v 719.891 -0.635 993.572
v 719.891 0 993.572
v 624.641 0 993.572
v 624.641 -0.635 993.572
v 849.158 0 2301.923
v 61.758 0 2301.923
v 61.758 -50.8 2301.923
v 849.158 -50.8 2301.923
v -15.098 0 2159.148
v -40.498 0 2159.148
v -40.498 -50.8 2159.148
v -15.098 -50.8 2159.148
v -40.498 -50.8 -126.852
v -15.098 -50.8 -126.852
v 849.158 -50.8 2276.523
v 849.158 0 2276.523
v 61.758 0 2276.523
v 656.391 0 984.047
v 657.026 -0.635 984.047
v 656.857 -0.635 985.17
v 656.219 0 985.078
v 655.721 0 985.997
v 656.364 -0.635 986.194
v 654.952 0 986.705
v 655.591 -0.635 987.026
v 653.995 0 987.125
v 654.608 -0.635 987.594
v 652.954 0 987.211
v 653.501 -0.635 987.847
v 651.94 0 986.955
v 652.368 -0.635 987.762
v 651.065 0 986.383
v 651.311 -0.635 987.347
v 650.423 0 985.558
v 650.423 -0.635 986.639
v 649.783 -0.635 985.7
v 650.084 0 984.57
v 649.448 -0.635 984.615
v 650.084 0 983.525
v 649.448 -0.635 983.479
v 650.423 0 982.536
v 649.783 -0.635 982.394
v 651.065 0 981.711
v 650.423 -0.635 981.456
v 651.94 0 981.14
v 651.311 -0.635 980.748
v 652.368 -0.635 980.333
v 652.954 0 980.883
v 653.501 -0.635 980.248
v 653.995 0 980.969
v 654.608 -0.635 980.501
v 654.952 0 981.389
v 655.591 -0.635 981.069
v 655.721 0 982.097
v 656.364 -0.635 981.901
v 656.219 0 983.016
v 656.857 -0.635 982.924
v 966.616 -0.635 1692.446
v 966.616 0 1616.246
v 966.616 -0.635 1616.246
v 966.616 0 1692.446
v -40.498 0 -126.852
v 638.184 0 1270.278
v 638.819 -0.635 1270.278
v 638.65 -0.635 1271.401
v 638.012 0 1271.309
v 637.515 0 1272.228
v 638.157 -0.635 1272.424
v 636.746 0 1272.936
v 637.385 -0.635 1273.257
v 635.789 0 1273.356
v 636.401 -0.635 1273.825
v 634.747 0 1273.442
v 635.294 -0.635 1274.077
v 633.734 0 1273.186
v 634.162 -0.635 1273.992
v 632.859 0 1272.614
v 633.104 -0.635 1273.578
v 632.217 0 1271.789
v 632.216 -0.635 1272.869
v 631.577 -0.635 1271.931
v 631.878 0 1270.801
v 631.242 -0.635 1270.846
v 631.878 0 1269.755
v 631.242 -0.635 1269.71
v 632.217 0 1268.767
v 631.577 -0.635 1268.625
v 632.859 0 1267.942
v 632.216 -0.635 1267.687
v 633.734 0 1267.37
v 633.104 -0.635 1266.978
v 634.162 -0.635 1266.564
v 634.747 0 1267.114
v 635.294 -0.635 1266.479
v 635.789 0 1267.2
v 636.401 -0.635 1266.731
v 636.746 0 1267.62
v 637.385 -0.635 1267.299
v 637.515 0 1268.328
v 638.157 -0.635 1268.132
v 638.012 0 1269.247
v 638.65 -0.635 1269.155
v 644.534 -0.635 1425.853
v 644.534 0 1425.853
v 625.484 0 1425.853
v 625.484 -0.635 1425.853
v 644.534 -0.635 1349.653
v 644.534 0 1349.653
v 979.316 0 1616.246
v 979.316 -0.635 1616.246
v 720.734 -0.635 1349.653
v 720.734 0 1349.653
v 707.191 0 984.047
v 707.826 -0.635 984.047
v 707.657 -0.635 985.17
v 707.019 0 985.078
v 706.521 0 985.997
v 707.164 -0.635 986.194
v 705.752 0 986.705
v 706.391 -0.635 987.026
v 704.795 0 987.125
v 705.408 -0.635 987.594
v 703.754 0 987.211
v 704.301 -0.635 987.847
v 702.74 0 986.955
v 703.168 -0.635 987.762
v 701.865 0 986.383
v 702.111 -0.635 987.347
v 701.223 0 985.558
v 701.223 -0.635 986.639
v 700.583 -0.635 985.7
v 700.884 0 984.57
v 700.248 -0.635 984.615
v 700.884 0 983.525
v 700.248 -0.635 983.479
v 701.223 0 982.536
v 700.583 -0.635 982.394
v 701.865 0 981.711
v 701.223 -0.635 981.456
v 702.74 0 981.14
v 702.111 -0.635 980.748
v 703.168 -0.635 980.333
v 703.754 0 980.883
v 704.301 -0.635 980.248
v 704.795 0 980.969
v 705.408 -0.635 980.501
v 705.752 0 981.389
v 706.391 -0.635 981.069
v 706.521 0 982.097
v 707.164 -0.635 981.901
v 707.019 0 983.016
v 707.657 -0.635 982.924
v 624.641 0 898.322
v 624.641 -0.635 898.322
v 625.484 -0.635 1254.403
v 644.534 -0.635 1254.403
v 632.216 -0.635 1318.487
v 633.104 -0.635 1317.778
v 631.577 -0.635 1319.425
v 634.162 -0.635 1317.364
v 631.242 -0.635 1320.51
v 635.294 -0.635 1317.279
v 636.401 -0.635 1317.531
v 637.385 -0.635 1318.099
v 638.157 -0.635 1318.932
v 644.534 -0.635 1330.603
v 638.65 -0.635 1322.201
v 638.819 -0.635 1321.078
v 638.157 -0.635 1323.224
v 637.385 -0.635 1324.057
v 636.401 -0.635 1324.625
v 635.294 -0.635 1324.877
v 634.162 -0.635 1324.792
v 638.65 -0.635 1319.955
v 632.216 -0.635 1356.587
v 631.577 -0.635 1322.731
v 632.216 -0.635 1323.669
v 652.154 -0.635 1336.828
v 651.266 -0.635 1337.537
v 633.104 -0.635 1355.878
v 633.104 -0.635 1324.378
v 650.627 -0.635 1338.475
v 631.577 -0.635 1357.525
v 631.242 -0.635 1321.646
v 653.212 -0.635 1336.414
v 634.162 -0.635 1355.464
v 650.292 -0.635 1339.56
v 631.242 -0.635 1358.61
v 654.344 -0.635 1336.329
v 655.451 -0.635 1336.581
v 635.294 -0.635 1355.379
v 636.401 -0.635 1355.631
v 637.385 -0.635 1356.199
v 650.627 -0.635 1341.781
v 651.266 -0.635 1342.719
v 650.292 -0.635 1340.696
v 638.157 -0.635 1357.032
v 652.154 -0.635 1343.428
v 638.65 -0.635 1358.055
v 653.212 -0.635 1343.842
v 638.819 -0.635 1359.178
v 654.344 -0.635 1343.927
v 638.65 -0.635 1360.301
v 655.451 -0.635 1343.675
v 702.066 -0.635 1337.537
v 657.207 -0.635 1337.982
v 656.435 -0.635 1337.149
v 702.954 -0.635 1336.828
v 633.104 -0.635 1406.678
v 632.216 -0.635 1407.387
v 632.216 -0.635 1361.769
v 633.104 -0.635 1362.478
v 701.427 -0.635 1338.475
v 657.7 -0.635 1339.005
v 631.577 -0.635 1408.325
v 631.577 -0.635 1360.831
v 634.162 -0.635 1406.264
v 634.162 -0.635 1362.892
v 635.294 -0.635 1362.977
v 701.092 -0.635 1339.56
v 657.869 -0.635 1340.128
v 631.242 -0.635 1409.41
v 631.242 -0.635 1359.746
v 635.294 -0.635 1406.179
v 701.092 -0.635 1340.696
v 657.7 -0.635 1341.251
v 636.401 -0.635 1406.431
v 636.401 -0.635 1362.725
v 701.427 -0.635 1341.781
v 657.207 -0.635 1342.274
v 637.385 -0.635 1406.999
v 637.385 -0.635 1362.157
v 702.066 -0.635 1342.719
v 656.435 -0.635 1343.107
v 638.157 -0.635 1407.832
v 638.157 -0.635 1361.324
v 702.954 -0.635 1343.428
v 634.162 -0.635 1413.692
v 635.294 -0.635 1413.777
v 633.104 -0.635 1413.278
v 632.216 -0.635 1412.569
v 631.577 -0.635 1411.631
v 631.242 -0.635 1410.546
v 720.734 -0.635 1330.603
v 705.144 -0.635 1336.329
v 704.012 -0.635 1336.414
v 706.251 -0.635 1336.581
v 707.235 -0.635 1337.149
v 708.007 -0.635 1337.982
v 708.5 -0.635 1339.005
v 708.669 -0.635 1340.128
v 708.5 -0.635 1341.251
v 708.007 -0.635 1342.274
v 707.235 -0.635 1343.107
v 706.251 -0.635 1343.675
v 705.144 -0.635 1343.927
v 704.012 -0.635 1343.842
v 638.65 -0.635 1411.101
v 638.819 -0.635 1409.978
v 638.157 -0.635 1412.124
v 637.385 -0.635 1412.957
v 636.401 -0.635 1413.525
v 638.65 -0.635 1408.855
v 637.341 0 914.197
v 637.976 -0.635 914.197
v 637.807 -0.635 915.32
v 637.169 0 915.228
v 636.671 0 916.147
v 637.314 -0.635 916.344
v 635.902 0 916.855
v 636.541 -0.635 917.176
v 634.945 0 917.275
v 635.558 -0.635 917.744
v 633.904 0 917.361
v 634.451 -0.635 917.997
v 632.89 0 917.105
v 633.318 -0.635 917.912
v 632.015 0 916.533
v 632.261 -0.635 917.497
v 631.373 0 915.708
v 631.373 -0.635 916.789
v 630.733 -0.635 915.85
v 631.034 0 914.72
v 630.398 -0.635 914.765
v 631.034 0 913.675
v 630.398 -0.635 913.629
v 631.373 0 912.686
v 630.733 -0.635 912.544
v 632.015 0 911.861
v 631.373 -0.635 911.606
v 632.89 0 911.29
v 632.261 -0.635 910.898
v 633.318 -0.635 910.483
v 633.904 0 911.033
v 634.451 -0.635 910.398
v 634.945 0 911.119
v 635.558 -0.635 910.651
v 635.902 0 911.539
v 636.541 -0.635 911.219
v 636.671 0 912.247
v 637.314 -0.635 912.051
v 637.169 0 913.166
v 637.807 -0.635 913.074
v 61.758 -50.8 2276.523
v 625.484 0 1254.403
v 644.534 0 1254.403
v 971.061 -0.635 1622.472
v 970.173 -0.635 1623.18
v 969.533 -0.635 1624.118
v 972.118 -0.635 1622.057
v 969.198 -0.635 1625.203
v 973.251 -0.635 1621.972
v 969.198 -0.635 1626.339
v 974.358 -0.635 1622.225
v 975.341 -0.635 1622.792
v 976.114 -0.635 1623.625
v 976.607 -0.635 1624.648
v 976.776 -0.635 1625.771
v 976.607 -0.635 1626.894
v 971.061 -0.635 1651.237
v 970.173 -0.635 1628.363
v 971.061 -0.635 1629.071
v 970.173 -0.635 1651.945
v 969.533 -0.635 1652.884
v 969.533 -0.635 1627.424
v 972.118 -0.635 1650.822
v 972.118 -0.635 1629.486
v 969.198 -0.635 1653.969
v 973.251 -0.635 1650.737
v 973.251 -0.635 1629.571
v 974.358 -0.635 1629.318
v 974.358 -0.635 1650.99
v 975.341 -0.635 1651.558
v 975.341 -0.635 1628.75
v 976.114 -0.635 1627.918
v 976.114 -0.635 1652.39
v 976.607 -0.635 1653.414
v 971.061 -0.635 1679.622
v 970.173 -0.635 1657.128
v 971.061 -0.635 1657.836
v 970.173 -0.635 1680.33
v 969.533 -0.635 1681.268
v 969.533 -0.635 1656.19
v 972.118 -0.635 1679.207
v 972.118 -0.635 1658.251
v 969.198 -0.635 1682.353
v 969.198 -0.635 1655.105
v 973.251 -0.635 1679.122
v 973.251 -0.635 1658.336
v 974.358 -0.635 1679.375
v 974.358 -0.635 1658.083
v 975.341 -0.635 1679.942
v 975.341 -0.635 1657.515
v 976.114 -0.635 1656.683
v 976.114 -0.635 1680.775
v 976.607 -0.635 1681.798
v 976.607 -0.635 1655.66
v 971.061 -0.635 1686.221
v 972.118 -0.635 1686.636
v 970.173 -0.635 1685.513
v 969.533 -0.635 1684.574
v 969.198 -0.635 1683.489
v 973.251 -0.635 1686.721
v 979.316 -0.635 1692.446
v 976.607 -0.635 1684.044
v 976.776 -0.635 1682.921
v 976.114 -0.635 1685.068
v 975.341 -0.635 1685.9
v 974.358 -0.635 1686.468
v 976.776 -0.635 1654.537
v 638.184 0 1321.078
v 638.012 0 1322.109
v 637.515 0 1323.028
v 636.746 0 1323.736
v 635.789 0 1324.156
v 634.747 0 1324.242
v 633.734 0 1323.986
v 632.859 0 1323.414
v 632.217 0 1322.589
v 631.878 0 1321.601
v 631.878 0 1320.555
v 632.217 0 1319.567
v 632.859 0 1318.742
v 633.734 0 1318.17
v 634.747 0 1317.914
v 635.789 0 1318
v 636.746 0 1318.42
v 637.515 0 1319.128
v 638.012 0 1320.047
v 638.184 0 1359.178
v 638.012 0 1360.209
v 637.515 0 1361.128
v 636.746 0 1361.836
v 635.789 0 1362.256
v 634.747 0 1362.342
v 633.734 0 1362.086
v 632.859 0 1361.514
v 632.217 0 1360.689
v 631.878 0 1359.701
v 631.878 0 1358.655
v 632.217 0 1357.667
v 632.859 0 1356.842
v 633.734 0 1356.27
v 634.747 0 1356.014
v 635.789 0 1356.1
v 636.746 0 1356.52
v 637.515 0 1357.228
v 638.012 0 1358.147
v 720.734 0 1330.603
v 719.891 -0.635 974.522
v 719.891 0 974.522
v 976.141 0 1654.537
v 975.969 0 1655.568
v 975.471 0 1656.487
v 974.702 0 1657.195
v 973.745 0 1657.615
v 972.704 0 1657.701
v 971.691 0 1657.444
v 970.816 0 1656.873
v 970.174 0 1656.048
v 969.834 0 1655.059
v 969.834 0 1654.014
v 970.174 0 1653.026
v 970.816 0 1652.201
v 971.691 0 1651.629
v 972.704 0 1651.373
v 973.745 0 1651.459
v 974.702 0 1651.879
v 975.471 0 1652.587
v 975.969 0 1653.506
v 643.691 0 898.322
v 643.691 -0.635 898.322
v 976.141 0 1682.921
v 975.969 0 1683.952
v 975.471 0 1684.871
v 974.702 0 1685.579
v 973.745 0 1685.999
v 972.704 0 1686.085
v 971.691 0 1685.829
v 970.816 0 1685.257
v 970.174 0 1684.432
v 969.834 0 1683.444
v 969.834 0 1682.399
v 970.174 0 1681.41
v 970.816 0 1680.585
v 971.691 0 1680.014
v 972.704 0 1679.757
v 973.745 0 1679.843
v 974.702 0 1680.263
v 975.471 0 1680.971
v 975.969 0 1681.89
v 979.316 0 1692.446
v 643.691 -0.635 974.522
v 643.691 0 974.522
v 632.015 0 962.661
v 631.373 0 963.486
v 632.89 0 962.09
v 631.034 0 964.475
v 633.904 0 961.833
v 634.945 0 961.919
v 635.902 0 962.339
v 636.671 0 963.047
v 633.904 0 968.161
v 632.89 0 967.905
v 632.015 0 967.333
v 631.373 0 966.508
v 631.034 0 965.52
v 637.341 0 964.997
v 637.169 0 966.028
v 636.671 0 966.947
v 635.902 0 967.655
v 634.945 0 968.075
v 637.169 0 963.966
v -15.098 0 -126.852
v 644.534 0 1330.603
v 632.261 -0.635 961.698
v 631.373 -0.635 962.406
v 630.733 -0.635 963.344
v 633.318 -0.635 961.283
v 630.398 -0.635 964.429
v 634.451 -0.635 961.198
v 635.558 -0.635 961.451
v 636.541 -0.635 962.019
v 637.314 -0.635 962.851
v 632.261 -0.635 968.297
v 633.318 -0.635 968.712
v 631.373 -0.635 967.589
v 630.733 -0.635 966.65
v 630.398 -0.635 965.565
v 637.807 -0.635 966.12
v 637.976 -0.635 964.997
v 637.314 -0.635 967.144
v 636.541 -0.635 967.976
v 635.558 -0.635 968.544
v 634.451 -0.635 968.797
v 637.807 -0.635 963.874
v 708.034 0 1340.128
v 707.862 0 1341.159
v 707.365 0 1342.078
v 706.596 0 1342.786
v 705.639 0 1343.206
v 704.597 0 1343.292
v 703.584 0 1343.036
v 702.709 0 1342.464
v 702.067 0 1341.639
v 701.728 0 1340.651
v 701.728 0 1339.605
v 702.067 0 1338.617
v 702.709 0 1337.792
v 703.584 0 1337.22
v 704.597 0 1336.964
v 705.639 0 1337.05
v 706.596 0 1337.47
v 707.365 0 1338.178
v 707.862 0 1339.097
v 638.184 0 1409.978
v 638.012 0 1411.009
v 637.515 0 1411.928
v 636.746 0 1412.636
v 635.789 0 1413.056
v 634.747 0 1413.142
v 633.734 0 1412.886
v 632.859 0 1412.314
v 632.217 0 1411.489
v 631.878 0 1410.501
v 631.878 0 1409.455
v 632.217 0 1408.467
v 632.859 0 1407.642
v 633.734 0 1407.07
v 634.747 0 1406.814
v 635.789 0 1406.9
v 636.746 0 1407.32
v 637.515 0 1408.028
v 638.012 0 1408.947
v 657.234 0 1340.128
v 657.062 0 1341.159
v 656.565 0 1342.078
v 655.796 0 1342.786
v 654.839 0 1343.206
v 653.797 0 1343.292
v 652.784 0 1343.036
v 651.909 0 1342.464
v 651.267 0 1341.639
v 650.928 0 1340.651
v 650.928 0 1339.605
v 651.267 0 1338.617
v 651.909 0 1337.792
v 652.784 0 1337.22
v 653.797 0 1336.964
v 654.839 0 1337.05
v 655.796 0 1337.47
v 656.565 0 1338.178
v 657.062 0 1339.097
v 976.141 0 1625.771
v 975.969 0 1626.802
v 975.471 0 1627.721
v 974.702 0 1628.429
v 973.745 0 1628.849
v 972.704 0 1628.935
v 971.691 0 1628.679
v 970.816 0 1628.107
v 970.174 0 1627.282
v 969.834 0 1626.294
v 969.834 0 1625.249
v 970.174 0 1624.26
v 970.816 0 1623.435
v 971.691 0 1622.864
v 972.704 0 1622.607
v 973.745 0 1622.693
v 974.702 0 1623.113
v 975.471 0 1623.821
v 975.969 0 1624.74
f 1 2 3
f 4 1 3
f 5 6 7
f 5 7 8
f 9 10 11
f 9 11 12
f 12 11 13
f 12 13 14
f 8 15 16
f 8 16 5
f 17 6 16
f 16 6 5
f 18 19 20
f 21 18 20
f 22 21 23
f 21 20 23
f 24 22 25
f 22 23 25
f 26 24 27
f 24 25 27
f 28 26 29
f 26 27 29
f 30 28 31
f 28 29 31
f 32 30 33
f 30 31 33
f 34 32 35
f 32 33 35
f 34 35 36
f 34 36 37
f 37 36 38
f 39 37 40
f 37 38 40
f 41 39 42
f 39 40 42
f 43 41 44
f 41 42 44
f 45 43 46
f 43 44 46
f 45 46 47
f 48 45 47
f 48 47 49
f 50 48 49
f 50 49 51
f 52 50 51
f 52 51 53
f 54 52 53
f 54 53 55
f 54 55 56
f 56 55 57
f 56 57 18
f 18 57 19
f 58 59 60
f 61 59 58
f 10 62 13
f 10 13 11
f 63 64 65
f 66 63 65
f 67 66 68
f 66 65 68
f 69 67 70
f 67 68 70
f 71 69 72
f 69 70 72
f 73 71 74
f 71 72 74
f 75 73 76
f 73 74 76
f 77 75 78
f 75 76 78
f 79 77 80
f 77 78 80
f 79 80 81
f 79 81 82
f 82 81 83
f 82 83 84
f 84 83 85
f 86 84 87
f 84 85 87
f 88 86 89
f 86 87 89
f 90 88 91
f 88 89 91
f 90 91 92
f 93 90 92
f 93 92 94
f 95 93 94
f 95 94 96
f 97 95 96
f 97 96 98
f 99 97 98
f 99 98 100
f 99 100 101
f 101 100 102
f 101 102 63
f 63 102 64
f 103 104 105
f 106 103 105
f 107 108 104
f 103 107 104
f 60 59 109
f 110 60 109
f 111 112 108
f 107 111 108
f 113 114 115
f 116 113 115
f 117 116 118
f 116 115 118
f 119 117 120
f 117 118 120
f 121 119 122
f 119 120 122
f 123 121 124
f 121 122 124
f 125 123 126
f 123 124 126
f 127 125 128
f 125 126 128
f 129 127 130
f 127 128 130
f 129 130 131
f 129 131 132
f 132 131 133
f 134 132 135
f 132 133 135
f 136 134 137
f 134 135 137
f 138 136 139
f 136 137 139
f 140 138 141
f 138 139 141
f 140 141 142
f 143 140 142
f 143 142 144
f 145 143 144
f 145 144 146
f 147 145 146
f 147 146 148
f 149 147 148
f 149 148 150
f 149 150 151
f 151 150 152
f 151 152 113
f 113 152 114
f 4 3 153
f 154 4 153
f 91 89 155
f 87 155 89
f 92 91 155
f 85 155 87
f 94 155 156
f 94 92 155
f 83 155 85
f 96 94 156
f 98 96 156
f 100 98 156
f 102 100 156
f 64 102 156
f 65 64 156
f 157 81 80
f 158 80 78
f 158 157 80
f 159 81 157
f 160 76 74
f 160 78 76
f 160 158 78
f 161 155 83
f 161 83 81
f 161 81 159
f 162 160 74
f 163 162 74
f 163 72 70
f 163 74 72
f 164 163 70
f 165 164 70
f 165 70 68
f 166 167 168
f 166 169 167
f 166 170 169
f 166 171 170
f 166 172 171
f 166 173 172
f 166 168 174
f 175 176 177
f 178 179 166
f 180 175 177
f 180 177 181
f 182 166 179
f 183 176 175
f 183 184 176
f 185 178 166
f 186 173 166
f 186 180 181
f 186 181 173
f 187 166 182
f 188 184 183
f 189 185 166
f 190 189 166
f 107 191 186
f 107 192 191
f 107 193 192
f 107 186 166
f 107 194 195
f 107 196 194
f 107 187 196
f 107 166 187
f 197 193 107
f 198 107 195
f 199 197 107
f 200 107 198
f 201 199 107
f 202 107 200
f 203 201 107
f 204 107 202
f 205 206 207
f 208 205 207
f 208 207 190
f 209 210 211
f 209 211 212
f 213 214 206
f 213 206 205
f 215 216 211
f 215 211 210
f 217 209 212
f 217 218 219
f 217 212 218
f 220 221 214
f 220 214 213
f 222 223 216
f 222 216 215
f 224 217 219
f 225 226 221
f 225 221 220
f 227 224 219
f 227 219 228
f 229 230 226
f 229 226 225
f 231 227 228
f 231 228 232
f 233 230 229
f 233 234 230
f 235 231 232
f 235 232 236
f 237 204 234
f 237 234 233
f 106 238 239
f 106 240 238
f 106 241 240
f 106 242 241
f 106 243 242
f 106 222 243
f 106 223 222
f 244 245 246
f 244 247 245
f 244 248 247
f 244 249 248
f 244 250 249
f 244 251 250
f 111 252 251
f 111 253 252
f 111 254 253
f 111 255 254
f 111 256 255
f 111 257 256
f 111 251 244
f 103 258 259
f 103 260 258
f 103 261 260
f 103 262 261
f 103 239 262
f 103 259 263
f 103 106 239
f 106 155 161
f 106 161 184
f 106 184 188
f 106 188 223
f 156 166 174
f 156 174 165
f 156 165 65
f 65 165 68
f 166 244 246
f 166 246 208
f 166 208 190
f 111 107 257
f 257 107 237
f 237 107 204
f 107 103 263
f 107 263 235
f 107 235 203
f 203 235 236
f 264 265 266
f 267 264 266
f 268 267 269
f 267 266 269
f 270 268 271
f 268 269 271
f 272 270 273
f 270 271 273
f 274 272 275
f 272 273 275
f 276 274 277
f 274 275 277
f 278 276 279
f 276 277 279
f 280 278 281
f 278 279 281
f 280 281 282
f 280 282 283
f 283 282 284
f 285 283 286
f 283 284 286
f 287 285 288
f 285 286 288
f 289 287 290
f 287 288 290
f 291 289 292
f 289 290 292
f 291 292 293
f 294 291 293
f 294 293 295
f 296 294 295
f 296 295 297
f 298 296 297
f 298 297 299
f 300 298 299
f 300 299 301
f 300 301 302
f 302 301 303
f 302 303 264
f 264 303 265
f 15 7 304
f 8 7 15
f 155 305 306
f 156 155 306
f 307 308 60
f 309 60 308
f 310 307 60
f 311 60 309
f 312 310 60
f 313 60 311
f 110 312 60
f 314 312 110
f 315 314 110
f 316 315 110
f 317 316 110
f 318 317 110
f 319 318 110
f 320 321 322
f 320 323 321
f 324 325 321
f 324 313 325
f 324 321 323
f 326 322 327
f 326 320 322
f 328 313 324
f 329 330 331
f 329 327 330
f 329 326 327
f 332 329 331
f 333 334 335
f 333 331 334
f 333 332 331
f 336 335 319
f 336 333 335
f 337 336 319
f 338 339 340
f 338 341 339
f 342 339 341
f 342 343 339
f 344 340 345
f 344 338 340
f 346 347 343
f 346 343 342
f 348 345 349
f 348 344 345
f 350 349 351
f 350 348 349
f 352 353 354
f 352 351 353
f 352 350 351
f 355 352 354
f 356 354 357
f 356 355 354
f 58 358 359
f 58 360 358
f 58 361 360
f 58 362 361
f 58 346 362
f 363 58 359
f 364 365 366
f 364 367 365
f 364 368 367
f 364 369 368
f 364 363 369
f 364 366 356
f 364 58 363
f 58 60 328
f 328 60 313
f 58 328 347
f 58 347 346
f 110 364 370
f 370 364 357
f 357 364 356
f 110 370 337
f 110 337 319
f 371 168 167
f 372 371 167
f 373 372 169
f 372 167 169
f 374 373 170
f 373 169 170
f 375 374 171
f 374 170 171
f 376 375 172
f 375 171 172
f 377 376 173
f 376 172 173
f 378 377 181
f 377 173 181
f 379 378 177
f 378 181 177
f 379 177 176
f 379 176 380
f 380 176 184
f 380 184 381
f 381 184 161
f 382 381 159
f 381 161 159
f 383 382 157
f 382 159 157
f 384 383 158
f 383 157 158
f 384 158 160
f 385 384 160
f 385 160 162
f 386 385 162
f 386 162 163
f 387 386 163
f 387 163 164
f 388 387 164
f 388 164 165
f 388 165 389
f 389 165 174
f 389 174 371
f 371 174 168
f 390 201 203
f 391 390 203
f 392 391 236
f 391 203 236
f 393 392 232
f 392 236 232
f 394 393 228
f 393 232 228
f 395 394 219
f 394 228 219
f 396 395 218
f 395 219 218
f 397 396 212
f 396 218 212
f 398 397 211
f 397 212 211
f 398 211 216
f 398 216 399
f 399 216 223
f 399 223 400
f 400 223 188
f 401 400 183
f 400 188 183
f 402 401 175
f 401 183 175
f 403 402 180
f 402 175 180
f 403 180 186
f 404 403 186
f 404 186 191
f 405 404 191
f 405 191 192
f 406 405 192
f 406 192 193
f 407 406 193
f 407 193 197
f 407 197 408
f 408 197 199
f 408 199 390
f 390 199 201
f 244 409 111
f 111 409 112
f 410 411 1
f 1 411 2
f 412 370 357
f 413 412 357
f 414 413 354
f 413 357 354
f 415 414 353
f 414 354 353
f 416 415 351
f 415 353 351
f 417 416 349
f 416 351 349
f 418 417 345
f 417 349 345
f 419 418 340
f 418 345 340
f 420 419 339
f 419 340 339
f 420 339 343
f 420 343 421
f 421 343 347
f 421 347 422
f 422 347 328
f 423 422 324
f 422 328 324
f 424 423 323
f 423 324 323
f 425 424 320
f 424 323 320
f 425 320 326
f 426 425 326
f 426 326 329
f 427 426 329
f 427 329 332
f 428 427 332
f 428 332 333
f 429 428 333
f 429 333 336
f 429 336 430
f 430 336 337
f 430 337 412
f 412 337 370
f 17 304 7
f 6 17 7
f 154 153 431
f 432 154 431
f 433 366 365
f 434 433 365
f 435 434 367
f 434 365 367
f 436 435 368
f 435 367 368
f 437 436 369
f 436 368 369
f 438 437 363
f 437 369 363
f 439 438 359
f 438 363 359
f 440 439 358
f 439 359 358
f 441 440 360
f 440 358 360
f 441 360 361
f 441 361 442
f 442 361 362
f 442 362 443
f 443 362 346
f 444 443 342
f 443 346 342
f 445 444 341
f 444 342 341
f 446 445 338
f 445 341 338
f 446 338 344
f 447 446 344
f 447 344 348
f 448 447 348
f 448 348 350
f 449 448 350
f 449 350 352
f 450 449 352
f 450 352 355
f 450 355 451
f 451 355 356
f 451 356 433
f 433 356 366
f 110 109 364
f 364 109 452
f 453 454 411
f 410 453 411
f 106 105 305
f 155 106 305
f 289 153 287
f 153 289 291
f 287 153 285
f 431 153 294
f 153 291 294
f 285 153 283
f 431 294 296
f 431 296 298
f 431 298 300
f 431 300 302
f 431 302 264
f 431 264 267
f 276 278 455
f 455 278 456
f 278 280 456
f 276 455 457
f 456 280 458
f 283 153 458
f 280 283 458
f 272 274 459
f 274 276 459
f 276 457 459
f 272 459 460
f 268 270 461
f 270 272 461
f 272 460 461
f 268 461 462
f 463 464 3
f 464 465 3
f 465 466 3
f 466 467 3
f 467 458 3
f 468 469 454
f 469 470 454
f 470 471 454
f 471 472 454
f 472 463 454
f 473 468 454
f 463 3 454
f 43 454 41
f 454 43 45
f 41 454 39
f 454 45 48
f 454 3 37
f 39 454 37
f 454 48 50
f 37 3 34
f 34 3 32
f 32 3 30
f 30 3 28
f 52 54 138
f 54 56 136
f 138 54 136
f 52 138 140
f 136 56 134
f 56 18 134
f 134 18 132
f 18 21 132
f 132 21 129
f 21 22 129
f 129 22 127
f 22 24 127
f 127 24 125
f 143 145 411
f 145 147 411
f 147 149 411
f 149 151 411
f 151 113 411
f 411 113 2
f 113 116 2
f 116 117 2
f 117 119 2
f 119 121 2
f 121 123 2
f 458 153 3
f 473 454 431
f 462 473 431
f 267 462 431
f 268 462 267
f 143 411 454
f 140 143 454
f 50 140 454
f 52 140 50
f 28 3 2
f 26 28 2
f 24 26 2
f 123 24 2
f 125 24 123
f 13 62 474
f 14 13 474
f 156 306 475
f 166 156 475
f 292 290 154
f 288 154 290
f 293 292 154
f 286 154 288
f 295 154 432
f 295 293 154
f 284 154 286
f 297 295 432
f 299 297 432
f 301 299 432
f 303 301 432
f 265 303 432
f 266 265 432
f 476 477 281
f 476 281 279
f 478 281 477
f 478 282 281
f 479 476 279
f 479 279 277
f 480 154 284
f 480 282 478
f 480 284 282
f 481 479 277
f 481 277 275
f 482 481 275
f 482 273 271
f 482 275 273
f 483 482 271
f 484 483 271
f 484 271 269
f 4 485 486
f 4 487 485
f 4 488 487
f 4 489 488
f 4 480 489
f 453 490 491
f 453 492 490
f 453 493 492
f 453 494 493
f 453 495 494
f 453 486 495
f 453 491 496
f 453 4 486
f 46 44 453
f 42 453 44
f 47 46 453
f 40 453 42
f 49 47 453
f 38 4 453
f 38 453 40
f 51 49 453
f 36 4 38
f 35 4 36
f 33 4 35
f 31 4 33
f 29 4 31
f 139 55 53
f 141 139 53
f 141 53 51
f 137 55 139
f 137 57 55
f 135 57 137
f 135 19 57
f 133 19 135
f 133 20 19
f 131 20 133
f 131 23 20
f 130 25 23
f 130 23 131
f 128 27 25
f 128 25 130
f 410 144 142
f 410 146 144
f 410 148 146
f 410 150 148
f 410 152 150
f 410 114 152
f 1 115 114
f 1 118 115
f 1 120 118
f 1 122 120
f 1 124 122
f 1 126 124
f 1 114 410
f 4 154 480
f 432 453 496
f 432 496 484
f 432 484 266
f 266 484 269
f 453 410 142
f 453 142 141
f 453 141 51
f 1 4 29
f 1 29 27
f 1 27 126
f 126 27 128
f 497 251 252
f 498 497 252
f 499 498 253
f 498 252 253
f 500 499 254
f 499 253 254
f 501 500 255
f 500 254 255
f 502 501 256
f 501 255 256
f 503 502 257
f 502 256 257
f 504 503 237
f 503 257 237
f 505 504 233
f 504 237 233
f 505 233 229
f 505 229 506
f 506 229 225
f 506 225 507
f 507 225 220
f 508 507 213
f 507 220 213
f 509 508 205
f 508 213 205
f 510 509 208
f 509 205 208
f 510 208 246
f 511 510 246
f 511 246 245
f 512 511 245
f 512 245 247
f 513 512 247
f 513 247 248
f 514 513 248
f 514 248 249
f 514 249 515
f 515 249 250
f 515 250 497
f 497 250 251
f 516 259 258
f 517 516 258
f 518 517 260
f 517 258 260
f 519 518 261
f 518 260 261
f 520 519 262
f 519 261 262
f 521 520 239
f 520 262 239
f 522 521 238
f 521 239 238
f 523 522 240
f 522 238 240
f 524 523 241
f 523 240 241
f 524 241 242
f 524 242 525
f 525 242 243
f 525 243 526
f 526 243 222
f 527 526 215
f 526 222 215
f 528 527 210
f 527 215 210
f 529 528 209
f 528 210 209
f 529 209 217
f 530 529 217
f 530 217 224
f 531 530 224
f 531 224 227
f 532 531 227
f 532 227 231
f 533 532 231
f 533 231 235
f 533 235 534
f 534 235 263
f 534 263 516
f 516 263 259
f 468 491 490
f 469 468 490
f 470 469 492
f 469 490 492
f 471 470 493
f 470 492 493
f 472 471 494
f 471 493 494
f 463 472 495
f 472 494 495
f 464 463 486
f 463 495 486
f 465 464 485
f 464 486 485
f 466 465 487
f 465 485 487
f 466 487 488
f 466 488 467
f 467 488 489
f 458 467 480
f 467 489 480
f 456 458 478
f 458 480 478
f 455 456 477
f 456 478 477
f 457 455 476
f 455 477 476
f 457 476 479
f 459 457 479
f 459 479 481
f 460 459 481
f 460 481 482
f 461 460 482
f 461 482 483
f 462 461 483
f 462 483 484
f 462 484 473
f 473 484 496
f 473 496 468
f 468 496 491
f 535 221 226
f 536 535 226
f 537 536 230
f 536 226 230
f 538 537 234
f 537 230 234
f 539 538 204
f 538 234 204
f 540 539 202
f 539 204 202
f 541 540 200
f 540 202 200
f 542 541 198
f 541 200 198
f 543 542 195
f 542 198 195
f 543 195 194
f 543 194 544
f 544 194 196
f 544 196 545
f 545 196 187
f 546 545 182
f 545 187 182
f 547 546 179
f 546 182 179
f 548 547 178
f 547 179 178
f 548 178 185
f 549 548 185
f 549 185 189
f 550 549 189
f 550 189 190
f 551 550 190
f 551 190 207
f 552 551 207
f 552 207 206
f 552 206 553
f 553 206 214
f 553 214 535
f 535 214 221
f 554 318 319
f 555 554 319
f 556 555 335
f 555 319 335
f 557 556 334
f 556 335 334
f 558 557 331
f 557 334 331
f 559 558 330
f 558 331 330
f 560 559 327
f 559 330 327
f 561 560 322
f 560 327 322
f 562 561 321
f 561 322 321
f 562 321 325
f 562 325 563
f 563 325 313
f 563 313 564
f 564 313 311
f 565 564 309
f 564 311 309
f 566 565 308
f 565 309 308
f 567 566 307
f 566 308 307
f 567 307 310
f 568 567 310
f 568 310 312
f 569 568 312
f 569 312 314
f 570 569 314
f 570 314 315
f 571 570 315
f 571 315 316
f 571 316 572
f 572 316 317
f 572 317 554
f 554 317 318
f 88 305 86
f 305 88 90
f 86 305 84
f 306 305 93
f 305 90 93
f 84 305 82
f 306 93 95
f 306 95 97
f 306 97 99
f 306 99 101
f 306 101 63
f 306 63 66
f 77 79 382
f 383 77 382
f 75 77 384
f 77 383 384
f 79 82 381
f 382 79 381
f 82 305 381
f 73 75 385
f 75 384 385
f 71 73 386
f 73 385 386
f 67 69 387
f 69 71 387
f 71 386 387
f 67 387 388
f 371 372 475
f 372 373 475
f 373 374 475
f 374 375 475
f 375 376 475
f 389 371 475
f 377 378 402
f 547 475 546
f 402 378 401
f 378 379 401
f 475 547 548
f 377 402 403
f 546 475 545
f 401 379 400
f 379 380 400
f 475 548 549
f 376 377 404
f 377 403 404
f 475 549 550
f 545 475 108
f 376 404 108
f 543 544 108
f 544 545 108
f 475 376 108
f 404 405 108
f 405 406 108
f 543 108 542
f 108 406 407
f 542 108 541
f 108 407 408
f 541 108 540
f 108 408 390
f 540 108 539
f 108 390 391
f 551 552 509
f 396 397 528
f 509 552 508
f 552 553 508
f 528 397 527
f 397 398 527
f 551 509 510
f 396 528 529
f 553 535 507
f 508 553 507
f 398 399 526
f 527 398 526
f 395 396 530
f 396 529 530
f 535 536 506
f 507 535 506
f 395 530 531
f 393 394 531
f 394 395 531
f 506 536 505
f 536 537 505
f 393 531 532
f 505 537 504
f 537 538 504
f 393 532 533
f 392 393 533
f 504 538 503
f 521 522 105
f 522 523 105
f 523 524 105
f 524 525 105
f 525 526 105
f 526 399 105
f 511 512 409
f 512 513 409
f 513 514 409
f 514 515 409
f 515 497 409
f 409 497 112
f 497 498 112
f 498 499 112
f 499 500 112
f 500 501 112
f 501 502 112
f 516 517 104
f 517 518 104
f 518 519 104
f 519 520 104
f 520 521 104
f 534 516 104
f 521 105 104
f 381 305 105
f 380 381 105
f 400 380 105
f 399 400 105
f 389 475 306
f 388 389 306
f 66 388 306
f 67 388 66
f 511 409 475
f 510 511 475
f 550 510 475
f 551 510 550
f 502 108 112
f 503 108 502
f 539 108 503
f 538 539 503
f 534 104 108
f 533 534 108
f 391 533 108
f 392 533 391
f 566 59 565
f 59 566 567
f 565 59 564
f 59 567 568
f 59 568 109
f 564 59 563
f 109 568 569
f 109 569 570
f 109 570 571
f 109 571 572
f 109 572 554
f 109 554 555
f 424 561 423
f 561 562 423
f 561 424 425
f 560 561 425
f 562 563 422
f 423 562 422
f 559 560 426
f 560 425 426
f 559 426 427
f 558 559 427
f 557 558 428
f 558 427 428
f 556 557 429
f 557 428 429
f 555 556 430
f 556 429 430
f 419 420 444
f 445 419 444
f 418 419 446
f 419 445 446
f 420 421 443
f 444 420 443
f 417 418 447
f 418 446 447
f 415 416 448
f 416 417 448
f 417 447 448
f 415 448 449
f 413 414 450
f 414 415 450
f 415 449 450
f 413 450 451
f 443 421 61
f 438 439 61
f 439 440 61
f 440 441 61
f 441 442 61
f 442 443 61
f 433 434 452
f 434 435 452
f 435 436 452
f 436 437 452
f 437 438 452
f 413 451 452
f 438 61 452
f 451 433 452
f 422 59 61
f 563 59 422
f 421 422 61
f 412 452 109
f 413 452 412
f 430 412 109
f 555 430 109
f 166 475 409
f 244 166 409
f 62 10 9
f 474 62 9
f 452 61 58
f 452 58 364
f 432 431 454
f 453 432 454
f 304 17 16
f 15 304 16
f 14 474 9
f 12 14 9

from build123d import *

# Parameters (mm, degrees)
F1_W      = 787.4
F1_H      = 25.4
F2_DEPTH  = 50.8
F0_W      = 25.4
F0_H      = 2286
F3_DEPTH  = 50.8
F4_R      = 3.175
F5_DEPTH  = 0.635
F6_R      = 3.175
F7_DEPTH  = 0.635
F8_SIZE   = 0.63499
F9_SIZE   = 0.63499
F10_W     = 12.7
F10_H     = 76.2
F10_R     = 3.175
F11_DEPTH = 0.635
F12_SIZE  = 0.63499


# Not quite as in the source:
# - a fillet or chamfer is up to 0.001 mm smaller than in the source, because OpenCascade refuses the exact size


with BuildPart() as f2:
    # F1 (on Front) → F2 (new body)
    with BuildSketch(Plane.XZ):
        with Locations((455.4581004176, 2289.2231941223)):
            Rectangle(F1_W, F1_H)
    extrude(amount=F2_DEPTH)


with BuildPart() as f3:
    # F0 (on Front) → F3 (new body)
    with BuildSketch(Plane.XZ):
        with Locations((-27.7979671955, 1016.1481191226)):
            Rectangle(F0_W, F0_H)
    extrude(amount=F3_DEPTH)


with BuildPart() as f5:
    # F4 (on Front) → F5 (new body)
    with BuildSketch(Plane.XZ):
        Polygon((624.6407955857, 993.5723245871), (624.6407955857, 898.3223245871), (643.6907955857, 898.3223245871), (643.6907955857, 974.5223245871), (719.8907955857, 974.5223245871), (719.8907955857, 993.5723245871), align=None)
        with Locations((634.1657955857, 914.1973245871)):
            Circle(F4_R, mode=Mode.SUBTRACT)
        with Locations((634.1657955857, 964.9973245871)):
            Circle(F4_R, mode=Mode.SUBTRACT)
        with Locations((653.2157955857, 984.0473245871)):
            Circle(F4_R, mode=Mode.SUBTRACT)
        with Locations((704.0157955857, 984.0473245871)):
            Circle(F4_R, mode=Mode.SUBTRACT)
    extrude(amount=F5_DEPTH)

    # F9 (size 0.635 in the source; OpenCascade refuses exactly that, so slightly less here)
    f9_edges = [f5.edges().sort_by_distance(p)[0] for p in [
        (700.840796, -0.635, 984.047325),
        (650.040796, -0.635, 984.047325),
        (630.990796, -0.635, 964.997325),
        (630.990796, -0.635, 914.197325),
    ]]
    chamfer(f9_edges, length=F9_SIZE)


with BuildPart() as f7:
    # F6 (on Front) → F7 (new body)
    with BuildSketch(Plane.XZ):
        Polygon((625.4843616006, 1425.8529662132), (625.4843616006, 1254.4029662132), (644.5343616006, 1254.4029662132), (644.5343616006, 1330.6029662132), (720.7343616006, 1330.6029662132), (720.7343616006, 1349.6529662132), (644.5343616006, 1349.6529662132), (644.5343616006, 1425.8529662132), align=None)
        with Locations((635.0093616006, 1270.2779662132)):
            Circle(F6_R, mode=Mode.SUBTRACT)
        with Locations((635.0093616006, 1321.0779662132)):
            Circle(F6_R, mode=Mode.SUBTRACT)
        with Locations((654.0593616006, 1340.1279662132)):
            Circle(F6_R, mode=Mode.SUBTRACT)
        with Locations((704.8593616006, 1340.1279662132)):
            Circle(F6_R, mode=Mode.SUBTRACT)
        with Locations((635.0093616006, 1359.1779662132)):
            Circle(F6_R, mode=Mode.SUBTRACT)
        with Locations((635.0093616006, 1409.9779662132)):
            Circle(F6_R, mode=Mode.SUBTRACT)
    extrude(amount=F7_DEPTH)

    # F8 (size 0.635 in the source; OpenCascade refuses exactly that, so slightly less here)
    f8_edges = [f7.edges().sort_by_distance(p)[0] for p in [
        (701.684362, -0.635, 1340.127966),
        (650.884362, -0.635, 1340.127966),
        (631.834362, -0.635, 1321.077966),
        (631.834362, -0.635, 1270.277966),
        (631.834362, -0.635, 1359.177966),
        (631.834362, -0.635, 1409.977966),
    ]]
    chamfer(f8_edges, length=F8_SIZE)


with BuildPart() as f11:
    # F10 (on Front) → F11 (new body)
    with BuildSketch(Plane.XZ):
        with Locations((972.9659259319, 1654.346266764)):
            Rectangle(F10_W, F10_H)
        with Locations((972.9659259319, 1625.771266764)):
            Circle(F10_R, mode=Mode.SUBTRACT)
        with Locations((972.9659259319, 1654.5367240906)):
            Circle(F10_R, mode=Mode.SUBTRACT)
        with Locations((972.9659259319, 1682.921266764)):
            Circle(F10_R, mode=Mode.SUBTRACT)
    extrude(amount=F11_DEPTH)

    # F12 (size 0.635 in the source; OpenCascade refuses exactly that, so slightly less here)
    f12_edges = [f11.edges().sort_by_distance(p)[0] for p in [
        (969.790926, -0.635, 1625.771267),
        (969.790926, -0.635, 1654.536724),
        (969.790926, -0.635, 1682.921267),
    ]]
    chamfer(f12_edges, length=F12_SIZE)


solid = Compound([f2.part, f3.part, f5.part, f7.part, f11.part])
